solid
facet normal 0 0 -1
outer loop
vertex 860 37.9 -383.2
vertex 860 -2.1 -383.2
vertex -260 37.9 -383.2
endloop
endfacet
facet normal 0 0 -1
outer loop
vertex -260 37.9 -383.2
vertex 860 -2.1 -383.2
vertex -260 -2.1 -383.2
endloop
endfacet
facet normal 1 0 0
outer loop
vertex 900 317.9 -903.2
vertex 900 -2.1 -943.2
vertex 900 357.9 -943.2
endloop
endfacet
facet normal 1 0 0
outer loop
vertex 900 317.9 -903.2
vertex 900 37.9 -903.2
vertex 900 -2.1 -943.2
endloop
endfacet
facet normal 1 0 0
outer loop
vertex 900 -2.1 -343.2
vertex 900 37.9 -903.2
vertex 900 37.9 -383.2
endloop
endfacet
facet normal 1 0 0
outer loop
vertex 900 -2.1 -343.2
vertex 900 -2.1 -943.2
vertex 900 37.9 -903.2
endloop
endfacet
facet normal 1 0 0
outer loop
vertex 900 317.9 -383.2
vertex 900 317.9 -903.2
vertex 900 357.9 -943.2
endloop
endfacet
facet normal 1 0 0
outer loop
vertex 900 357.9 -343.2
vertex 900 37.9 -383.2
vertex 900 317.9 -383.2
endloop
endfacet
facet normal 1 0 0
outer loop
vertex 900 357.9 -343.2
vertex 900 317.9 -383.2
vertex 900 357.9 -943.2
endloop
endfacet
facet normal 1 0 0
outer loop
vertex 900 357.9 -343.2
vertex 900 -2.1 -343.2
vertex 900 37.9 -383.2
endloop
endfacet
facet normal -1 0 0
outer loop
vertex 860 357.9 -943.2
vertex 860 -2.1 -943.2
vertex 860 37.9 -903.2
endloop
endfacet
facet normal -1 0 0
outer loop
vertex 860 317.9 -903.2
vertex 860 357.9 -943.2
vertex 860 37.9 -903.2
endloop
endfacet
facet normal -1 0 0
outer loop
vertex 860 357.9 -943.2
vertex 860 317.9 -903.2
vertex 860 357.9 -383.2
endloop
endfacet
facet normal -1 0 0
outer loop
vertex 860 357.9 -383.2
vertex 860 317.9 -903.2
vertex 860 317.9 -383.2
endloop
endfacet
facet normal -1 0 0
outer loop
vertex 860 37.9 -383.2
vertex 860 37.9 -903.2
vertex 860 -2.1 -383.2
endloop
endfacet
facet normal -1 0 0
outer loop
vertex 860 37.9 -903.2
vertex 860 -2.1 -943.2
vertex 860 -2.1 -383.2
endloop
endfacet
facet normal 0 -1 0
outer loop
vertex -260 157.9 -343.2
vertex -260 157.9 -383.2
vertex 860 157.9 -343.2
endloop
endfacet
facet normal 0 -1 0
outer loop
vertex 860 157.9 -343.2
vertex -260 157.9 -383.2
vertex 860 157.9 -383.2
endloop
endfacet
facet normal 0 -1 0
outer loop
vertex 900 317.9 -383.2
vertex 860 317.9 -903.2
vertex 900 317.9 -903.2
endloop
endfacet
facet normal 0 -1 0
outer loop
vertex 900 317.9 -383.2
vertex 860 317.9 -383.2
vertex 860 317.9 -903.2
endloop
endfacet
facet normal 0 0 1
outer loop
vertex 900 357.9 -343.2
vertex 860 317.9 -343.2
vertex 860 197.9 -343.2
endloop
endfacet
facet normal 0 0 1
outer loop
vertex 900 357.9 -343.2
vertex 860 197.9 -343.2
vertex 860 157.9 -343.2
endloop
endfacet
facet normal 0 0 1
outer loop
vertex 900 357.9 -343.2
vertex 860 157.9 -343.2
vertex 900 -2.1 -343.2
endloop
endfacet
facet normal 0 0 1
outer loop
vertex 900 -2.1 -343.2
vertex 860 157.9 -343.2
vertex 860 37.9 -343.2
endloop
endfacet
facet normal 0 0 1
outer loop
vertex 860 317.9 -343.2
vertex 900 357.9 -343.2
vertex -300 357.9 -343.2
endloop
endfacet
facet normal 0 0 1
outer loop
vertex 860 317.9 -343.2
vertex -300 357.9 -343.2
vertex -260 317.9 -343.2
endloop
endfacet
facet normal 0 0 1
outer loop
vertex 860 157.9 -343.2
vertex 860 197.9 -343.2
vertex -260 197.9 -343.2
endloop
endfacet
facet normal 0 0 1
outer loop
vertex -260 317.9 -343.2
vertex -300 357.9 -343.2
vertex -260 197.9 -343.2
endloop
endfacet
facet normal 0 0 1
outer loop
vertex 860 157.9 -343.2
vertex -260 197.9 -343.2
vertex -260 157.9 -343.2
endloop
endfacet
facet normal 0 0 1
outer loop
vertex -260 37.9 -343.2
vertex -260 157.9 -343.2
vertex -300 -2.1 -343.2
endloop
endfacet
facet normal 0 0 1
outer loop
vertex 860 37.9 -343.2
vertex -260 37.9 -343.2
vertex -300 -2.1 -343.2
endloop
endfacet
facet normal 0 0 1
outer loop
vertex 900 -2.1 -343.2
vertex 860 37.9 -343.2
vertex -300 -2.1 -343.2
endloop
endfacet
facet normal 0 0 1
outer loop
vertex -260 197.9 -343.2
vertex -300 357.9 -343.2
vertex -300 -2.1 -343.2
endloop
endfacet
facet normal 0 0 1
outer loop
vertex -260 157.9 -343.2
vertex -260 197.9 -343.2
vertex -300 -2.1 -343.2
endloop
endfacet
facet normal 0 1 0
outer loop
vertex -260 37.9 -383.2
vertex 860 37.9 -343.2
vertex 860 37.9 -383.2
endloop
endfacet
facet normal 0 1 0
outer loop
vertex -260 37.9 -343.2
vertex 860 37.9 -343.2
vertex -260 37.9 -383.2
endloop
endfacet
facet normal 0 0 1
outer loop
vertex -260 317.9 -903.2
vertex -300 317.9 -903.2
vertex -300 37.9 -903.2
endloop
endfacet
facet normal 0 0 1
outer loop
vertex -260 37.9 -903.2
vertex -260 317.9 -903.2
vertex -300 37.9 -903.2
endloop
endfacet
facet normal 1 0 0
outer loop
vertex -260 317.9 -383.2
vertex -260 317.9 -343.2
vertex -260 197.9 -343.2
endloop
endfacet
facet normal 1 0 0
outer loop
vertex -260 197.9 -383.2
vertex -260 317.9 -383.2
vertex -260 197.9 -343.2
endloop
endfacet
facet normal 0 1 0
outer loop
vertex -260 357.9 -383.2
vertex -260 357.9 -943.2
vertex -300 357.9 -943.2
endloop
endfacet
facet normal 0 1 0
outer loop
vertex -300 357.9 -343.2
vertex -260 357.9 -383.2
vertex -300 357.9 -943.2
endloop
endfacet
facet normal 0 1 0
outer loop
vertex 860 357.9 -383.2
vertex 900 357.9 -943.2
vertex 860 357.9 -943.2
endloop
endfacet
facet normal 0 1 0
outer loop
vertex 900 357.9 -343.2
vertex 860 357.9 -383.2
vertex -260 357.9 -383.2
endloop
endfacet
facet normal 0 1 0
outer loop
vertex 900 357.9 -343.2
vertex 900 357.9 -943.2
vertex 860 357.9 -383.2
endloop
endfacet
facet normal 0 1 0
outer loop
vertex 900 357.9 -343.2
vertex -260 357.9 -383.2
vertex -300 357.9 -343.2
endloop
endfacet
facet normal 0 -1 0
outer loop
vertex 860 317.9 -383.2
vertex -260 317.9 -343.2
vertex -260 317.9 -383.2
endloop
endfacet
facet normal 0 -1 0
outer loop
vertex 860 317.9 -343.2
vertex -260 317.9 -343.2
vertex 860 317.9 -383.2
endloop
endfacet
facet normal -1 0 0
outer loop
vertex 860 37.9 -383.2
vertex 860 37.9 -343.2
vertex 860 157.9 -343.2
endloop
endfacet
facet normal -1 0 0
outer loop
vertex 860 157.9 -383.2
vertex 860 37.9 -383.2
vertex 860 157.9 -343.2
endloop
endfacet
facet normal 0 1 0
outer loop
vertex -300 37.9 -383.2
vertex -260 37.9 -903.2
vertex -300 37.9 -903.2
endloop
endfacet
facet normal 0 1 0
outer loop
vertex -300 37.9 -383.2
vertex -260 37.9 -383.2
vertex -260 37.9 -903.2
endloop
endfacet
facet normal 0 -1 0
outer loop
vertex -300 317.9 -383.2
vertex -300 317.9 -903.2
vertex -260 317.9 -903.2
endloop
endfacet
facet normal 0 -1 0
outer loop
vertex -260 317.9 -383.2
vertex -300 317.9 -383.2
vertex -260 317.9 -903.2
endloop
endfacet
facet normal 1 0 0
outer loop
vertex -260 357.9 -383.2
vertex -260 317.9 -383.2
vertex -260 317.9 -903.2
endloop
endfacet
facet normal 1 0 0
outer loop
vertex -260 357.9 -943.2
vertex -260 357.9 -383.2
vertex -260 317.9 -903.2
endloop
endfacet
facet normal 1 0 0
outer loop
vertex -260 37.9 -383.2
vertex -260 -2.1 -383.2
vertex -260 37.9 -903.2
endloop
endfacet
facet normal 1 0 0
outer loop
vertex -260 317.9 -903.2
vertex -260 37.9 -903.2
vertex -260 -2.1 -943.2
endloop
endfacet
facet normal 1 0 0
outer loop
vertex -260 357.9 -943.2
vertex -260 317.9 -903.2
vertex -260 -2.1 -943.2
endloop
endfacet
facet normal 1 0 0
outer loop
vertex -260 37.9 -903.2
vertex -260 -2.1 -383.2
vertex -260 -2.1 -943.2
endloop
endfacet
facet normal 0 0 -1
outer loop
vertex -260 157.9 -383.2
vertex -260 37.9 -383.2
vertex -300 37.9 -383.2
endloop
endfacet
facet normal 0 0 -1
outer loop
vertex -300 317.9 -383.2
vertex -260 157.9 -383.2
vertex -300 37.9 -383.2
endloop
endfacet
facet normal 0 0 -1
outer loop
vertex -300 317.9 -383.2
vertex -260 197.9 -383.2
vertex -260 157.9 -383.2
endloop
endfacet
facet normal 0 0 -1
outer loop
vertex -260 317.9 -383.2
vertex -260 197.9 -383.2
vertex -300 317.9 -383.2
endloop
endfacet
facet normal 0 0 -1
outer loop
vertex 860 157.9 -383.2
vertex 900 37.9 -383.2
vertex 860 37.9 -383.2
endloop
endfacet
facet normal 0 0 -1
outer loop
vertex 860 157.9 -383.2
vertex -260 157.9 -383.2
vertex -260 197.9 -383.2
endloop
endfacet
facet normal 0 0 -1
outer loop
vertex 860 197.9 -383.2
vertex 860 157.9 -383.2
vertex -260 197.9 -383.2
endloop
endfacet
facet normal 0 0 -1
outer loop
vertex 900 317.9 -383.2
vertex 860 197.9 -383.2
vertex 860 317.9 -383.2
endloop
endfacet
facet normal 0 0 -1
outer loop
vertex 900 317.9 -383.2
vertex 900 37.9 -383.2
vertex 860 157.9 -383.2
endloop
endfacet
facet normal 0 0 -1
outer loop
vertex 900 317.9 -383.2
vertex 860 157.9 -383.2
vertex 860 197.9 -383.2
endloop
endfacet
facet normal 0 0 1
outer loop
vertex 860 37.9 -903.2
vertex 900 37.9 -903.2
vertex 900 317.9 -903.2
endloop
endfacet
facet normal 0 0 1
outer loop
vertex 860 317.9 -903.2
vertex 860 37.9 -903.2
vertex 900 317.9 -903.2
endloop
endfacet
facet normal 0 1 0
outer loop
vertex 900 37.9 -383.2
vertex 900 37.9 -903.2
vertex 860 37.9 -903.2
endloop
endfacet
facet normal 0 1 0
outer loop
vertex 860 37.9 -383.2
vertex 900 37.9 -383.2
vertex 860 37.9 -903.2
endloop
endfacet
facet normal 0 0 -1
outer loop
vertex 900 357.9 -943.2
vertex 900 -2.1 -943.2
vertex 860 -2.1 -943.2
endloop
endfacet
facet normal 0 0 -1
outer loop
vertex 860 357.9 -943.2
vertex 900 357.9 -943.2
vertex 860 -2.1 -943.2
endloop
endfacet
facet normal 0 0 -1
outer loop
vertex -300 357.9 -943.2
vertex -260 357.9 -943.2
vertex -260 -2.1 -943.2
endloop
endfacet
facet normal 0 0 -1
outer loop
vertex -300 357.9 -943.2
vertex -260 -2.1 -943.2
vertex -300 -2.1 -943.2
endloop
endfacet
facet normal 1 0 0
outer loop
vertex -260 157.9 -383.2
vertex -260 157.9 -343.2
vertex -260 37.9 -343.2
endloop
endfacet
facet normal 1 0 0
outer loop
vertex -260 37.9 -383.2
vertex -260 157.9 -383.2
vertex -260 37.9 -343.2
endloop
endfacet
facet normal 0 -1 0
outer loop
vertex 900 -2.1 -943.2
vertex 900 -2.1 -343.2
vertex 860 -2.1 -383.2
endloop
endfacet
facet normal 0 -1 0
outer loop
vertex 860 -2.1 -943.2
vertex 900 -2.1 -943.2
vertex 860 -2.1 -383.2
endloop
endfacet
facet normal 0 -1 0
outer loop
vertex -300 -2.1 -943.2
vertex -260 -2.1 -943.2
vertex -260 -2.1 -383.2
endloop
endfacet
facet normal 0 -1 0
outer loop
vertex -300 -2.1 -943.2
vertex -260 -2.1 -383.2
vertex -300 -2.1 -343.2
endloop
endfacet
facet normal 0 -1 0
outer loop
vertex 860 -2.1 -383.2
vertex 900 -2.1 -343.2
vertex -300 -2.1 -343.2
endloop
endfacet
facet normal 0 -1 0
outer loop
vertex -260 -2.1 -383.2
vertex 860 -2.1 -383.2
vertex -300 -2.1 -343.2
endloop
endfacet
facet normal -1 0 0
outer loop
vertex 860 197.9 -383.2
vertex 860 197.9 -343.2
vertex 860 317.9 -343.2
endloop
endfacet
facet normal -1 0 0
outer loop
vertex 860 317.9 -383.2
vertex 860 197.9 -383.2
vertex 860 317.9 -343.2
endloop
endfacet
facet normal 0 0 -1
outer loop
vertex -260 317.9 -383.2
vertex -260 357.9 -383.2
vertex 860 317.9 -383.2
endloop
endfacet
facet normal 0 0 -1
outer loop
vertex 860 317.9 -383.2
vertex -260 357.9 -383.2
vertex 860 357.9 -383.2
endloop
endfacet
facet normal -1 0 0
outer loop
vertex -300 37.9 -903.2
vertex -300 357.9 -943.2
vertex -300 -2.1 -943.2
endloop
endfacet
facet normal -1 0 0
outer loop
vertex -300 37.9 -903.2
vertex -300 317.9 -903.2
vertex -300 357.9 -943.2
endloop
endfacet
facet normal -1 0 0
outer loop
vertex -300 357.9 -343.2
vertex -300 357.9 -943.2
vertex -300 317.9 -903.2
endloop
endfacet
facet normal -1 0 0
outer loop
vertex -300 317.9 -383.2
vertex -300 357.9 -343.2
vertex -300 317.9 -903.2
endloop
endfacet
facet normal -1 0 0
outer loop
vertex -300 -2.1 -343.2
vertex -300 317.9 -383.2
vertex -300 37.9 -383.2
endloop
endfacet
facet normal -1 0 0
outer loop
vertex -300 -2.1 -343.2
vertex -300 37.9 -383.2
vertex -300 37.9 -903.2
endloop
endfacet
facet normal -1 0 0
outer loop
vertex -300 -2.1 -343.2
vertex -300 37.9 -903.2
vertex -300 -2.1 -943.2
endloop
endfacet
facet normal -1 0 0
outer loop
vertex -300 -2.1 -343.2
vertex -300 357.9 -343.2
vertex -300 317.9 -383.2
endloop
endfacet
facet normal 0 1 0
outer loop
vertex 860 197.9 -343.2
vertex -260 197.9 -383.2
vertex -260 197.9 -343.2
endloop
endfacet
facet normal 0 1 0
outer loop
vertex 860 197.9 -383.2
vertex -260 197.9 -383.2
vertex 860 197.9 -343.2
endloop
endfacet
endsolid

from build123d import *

# Parameters (mm, degrees)
PAD019_DEPTH = 40
SKETCH075_W  = 320
SKETCH075_H  = 40
PAD020_DEPTH = 40
SKETCH076_W  = 320
SKETCH076_H  = 40
PAD021_DEPTH = 40
PAD022_DEPTH = 40
SKETCH078_W  = 1120
SKETCH078_H  = 40
PAD023_DEPTH = 40


with BuildPart() as part:
    # Sketch074 (on Face1 of Binder024) → Pad019 (new body)
    with BuildSketch(Plane.XZ.offset(2.1)):
        Polygon((-300, -343.2), (900, -343.2), (900, -943.2), (860, -943.2), (860, -383.2), (-260, -383.2), (-260, -943.2), (-300, -943.2), align=None)
    extrude(amount=-PAD019_DEPTH)

    # Sketch075 (on Face2 of Pad019) → Pad020 (join)
    with BuildSketch(Plane.YZ.offset(900)):
        with Locations((197.9, -363.2)):
            Rectangle(SKETCH075_W, SKETCH075_H)
        with Locations((197.9, -923.2)):
            Rectangle(SKETCH075_W, SKETCH075_H)
    extrude(amount=-PAD020_DEPTH)

    # Sketch076 (on Face1 of Pad020) → Pad021 (join)
    with BuildSketch(Plane(origin=(-300, 0, 0), x_dir=(0, -1, 0), z_dir=(-1, 0, 0))):
        with Locations((-197.9, -363.2)):
            Rectangle(SKETCH076_W, SKETCH076_H)
        with Locations((-197.9, -923.2)):
            Rectangle(SKETCH076_W, SKETCH076_H)
    extrude(amount=-PAD021_DEPTH)

    # Sketch077 (on Face9 of Pad021) → Pad022 (join)
    with BuildSketch(Plane(origin=(0, 357.9, 0), x_dir=(-1, 0, 0), z_dir=(0, 1, 0))):
        Polygon((-900, -943.2), (-900, -343.2), (300, -343.2), (300, -943.2), (260, -943.2), (260, -383.2), (-860, -383.2), (-860, -943.2), align=None)
    extrude(amount=-PAD022_DEPTH)

    # Sketch078 (on Face2 of Pad022) → Pad023 (join)
    with BuildSketch(Plane(origin=(0, 0, -383.2), x_dir=(1, 0, 0), z_dir=(0, 0, -1))):
        with Locations((300, -177.9)):
            Rectangle(SKETCH078_W, SKETCH078_H)
    extrude(amount=-PAD023_DEPTH)


solid = part.part
